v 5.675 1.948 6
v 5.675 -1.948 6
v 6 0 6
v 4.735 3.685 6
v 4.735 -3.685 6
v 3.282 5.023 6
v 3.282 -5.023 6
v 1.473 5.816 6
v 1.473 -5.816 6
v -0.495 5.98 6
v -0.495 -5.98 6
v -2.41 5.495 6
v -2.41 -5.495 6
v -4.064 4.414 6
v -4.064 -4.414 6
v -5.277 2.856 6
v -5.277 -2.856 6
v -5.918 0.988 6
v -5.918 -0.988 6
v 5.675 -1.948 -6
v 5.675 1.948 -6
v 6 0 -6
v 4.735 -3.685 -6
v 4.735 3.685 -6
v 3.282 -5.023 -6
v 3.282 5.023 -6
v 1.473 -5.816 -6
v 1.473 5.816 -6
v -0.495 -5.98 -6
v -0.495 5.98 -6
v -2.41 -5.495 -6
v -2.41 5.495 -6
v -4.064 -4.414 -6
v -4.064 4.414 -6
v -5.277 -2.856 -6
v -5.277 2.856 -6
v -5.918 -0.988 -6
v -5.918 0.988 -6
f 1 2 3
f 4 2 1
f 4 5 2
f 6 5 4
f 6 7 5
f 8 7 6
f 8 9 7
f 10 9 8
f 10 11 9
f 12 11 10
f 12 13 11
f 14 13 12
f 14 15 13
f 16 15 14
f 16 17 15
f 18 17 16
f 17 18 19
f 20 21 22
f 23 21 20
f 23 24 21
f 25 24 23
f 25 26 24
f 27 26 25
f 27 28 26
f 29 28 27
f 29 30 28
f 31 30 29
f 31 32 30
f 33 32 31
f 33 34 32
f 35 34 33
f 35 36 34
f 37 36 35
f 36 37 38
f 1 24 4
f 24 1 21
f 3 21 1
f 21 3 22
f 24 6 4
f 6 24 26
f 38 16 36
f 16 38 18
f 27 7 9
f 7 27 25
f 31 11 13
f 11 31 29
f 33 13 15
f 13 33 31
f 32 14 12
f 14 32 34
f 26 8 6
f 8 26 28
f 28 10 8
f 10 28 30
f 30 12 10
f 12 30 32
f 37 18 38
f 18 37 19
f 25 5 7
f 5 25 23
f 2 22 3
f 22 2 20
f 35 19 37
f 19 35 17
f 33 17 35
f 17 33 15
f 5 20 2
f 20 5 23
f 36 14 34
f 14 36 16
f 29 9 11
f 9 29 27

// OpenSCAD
intersection(){
  cube([28, 16, 12], center=true);
  cylinder(h=12, r1=6, r2=6, center=true);
}
